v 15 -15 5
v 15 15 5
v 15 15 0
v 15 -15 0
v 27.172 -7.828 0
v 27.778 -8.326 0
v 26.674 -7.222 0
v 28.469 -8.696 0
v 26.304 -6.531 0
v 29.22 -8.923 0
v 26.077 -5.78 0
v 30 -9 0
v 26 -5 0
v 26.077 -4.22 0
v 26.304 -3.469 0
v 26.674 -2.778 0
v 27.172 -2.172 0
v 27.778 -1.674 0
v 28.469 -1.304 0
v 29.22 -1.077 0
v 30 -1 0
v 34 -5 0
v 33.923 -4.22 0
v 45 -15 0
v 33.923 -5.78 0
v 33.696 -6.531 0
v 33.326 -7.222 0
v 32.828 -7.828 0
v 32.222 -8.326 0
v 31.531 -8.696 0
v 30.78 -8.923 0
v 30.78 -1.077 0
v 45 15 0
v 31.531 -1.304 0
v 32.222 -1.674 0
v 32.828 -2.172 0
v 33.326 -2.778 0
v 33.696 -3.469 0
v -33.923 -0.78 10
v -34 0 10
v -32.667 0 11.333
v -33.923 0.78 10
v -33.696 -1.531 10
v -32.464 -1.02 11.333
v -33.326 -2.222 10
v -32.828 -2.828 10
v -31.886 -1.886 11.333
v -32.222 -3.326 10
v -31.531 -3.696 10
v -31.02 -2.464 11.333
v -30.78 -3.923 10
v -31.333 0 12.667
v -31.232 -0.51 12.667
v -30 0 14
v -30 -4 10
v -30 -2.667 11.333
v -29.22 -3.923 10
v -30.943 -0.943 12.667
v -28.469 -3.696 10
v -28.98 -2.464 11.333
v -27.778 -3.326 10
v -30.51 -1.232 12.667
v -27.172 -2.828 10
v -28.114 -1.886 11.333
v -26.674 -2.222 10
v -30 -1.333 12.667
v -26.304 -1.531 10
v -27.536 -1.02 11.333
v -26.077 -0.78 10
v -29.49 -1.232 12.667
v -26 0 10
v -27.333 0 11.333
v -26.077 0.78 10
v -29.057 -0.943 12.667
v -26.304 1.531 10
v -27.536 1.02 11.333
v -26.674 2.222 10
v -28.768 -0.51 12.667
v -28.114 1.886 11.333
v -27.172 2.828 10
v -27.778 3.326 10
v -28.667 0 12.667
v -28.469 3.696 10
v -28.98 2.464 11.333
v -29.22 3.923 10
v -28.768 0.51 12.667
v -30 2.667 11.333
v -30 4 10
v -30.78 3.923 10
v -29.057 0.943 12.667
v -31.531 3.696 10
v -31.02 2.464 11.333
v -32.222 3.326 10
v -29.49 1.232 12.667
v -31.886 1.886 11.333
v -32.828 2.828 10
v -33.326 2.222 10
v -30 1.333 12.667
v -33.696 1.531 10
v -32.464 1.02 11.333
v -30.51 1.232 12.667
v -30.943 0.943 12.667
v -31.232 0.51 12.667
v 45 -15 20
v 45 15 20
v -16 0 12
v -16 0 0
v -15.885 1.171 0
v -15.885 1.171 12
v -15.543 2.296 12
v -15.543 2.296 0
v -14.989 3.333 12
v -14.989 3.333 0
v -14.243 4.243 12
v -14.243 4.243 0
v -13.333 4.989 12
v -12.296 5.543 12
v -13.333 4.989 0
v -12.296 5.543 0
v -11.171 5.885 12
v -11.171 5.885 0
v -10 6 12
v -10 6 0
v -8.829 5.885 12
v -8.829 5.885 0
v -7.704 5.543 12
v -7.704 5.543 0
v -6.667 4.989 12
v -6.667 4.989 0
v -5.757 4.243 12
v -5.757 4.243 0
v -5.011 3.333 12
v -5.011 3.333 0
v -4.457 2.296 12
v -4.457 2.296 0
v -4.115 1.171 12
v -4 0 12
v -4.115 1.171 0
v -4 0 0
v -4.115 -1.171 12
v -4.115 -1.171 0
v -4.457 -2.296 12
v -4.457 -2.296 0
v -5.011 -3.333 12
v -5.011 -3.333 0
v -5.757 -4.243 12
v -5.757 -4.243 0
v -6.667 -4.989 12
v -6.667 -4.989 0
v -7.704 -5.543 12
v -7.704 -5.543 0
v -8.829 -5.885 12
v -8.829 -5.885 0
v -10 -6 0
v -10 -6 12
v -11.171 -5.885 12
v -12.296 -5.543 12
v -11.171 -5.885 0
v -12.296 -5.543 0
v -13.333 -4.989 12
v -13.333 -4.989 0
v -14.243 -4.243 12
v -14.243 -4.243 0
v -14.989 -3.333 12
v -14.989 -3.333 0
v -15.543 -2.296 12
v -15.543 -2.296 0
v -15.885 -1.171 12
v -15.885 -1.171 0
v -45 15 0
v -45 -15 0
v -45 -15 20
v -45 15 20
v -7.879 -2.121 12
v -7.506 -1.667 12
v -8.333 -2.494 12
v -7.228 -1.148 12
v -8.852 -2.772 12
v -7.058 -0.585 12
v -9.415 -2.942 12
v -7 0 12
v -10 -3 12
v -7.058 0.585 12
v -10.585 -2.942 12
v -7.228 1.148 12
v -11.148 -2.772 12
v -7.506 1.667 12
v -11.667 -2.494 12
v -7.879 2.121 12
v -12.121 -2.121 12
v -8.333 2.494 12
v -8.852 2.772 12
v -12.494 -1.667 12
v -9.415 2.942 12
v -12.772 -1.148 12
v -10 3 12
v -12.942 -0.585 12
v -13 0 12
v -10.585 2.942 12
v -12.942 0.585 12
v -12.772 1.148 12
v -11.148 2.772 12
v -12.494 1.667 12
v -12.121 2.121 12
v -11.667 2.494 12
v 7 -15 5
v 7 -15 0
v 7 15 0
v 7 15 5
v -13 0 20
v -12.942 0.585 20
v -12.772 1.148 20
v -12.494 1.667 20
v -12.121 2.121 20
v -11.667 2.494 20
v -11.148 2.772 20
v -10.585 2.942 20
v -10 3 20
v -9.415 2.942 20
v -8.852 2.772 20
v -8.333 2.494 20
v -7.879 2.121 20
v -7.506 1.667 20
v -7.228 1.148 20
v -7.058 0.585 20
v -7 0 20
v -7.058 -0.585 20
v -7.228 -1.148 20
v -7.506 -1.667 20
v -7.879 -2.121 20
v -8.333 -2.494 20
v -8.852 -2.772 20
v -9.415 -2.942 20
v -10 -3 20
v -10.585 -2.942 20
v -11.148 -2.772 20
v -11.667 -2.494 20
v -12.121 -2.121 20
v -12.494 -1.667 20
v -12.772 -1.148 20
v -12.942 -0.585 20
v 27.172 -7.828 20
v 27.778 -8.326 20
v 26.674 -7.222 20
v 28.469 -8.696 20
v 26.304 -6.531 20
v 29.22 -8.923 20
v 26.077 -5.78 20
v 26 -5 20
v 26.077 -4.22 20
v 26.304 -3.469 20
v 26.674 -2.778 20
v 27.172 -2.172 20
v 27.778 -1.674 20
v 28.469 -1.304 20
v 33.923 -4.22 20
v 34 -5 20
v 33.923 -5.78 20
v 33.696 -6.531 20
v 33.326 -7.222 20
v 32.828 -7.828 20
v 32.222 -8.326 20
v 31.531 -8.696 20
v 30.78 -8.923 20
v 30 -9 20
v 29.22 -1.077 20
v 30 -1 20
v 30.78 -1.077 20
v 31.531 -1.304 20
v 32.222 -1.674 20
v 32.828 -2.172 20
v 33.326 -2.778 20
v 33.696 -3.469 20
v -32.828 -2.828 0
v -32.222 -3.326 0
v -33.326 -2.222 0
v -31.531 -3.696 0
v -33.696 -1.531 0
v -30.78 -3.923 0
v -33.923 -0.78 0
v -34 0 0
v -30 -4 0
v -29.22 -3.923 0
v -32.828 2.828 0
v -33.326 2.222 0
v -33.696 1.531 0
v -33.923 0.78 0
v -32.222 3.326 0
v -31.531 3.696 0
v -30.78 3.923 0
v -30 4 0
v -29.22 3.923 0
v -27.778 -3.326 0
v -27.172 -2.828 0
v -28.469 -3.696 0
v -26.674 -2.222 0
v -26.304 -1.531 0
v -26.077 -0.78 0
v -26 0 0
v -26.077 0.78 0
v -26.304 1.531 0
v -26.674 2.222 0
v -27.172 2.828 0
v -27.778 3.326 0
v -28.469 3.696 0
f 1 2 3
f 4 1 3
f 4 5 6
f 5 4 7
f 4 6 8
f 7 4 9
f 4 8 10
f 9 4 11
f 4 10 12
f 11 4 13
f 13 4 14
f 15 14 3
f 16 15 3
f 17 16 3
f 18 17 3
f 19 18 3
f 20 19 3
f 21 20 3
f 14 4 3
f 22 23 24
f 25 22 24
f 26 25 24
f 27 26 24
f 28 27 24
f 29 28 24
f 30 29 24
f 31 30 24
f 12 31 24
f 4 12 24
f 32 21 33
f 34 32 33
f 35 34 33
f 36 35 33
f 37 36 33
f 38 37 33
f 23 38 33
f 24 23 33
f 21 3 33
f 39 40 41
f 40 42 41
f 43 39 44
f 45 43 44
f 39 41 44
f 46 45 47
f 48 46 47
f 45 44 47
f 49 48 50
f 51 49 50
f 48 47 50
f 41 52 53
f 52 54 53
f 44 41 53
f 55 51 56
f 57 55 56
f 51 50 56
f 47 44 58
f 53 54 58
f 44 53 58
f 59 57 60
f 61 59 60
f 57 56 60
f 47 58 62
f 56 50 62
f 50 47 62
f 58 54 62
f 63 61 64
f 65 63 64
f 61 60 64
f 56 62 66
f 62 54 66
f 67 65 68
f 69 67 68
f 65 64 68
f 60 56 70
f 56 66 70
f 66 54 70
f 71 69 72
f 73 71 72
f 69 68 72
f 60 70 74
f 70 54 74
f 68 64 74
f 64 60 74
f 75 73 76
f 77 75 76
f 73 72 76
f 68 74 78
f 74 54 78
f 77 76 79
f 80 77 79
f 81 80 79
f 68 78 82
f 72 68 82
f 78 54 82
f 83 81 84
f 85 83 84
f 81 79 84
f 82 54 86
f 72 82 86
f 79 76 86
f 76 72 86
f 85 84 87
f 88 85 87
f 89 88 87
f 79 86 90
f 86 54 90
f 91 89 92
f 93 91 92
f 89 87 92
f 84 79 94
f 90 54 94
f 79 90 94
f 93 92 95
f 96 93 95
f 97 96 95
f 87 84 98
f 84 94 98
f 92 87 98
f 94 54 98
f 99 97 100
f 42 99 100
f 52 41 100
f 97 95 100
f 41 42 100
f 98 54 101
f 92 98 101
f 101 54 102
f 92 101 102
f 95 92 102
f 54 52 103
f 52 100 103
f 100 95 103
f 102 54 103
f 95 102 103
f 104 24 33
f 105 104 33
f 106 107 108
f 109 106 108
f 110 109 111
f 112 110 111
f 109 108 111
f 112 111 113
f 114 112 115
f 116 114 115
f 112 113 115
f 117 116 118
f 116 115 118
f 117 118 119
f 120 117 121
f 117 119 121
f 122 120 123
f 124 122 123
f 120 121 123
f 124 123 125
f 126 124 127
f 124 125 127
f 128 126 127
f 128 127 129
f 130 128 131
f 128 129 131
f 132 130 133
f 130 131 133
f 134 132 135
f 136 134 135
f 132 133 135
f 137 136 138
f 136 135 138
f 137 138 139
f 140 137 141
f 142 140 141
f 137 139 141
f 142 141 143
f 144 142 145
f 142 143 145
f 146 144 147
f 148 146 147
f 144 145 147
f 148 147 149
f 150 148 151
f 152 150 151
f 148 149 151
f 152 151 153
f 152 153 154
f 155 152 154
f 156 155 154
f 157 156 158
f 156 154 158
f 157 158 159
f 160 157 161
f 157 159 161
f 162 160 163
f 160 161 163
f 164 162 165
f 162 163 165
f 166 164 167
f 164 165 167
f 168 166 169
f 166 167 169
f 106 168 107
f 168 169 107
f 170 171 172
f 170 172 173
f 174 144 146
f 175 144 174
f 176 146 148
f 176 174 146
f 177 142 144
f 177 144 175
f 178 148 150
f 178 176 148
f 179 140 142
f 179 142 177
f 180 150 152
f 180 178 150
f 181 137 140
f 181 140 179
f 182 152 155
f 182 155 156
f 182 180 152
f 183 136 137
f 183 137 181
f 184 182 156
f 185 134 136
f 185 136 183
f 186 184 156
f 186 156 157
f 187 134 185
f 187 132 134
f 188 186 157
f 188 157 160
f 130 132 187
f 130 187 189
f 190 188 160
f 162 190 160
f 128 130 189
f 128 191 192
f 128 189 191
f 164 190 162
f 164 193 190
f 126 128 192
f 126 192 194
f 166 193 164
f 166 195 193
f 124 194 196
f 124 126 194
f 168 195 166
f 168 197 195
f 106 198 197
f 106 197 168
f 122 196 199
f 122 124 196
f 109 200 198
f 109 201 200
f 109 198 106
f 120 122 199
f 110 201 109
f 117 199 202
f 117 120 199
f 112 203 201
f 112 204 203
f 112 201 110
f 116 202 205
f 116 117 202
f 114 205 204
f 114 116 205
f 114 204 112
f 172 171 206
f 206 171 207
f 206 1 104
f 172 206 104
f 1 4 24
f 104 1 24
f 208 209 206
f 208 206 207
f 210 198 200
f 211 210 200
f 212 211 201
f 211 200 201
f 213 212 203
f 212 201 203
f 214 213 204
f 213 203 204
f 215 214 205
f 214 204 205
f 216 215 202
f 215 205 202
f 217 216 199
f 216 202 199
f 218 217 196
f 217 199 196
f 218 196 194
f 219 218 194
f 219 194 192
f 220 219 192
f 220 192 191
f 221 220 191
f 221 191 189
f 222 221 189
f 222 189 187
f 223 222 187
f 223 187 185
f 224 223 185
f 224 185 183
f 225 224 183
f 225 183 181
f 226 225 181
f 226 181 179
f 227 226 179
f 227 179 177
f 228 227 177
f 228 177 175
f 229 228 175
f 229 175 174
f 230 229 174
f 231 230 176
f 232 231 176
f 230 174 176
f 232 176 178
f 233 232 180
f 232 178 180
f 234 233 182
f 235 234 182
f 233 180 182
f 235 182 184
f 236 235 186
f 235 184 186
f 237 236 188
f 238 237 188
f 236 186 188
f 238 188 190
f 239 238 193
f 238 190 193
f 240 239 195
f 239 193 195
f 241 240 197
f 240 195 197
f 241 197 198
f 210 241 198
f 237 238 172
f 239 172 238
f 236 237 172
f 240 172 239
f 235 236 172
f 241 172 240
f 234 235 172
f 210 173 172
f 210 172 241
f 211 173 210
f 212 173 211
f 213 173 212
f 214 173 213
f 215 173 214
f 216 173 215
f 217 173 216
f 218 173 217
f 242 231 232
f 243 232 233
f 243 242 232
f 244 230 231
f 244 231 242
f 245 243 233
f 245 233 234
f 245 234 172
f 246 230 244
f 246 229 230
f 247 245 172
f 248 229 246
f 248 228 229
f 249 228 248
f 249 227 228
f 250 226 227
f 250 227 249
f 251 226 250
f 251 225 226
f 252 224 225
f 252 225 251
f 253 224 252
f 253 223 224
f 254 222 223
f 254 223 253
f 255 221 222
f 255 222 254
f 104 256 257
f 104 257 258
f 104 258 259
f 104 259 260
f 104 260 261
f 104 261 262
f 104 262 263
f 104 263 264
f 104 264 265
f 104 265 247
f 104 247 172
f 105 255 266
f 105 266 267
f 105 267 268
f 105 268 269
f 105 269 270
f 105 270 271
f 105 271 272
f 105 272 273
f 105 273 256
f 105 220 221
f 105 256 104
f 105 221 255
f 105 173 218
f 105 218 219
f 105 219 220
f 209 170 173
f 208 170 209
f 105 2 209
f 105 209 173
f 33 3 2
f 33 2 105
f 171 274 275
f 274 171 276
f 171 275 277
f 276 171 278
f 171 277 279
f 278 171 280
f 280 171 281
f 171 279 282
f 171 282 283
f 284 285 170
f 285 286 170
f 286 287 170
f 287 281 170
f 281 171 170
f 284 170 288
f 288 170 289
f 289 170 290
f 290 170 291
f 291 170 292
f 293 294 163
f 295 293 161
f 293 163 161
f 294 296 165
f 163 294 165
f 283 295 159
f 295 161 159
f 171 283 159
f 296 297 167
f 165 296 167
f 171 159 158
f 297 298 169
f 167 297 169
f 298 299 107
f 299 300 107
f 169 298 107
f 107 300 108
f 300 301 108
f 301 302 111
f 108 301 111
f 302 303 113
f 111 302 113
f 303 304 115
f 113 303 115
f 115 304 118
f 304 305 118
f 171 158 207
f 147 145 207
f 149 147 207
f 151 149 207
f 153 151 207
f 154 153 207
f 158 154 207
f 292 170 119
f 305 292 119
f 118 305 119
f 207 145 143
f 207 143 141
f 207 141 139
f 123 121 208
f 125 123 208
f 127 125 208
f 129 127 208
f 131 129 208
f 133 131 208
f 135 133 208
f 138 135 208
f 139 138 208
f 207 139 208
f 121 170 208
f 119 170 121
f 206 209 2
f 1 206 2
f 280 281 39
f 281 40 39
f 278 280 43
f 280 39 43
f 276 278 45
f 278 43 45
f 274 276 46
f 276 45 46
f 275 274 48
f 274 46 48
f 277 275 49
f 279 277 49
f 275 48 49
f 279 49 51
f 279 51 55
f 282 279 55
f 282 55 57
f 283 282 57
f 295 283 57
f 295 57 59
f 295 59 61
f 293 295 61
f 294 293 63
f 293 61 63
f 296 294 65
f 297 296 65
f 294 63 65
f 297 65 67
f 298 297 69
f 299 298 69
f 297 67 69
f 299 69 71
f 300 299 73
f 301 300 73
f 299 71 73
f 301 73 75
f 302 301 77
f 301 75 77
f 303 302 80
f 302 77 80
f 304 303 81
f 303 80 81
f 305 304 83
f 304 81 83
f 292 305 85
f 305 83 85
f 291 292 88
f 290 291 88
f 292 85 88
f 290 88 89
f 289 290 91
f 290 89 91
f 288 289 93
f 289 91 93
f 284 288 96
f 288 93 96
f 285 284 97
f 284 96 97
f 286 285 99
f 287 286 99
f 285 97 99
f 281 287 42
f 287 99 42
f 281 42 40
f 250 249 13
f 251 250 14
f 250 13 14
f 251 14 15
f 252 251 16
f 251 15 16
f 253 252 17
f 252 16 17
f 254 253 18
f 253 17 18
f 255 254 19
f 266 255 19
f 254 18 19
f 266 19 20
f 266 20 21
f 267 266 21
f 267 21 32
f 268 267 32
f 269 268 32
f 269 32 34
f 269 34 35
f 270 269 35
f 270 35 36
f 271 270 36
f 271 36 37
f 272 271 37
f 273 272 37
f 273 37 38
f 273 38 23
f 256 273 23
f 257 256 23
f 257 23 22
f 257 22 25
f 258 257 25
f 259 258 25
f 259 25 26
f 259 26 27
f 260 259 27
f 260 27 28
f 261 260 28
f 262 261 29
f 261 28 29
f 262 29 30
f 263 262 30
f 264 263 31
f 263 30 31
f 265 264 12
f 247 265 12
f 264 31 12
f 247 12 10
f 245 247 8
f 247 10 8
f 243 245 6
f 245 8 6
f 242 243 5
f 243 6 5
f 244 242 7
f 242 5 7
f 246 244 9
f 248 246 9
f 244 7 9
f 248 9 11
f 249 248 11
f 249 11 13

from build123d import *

# Parameters (mm, degrees)
SKETCH_1_W          = 90
SKETCH_1_H          = 30
EXTRUDE_1_DEPTH     = 20
SKETCH_3_R          = 6
CUT_EXTRUDE_1_DEPTH = 12
SKETCH_4_R          = 3
CUT_EXTRUDE_2_DEPTH = 49.928519291
SKETCH_5_W          = 8
SKETCH_5_H          = 5
CUT_EXTRUDE_3_DEPTH = 58.662812973
SKETCH_6_R          = 4
CUT_EXTRUDE_4_DEPTH = 52.478150705


with BuildPart() as part:
    # Эскиз1 → Бобышка-Вытянуть1 (new body)
    with BuildSketch(Plane.XY):
        Rectangle(SKETCH_1_W, SKETCH_1_H)
    extrude(amount=EXTRUDE_1_DEPTH)

    # Эскиз2 → Вырез-Повернуть1 (revolve, cut)
    with BuildSketch(Plane(origin=(0, 0, 0), x_dir=(1, 0, 0), z_dir=(0, 1, 0)), mode=Mode.PRIVATE) as cut_revolve_1_sk:
        Polygon((-30, 0), (-26, 0), (-26, -10), (-30, -14), align=None)
    revolve(cut_revolve_1_sk.sketch.rotate(Axis((-30, 0, 0), (0, 0, 1)), 180), axis=Axis((-30, 0, 0), (0, 0, 1)), mode=Mode.SUBTRACT)

    # Эскиз3 → Вырез-Вытянуть1 (cut)
    with BuildSketch(Plane(origin=(0, 0, 0), x_dir=(-1, 0, 0), z_dir=(0, 0, -1))):
        with Locations((10, 0)):
            Circle(SKETCH_3_R)
    extrude(amount=-CUT_EXTRUDE_1_DEPTH, mode=Mode.SUBTRACT)

    # Эскиз4 → Вырез-Вытянуть2 (cut, through all)
    with BuildSketch(Plane(origin=(0, 0, 12), x_dir=(-1, 0, 0), z_dir=(0, 0, -1))):
        with Locations((10, 0)):
            Circle(SKETCH_4_R)
    extrude(amount=-CUT_EXTRUDE_2_DEPTH, mode=Mode.SUBTRACT)

    # Эскиз5 → Вырез-Вытянуть3 (cut, through all)
    with BuildSketch(Plane(origin=(0, 15, 0), x_dir=(1, 0, 0), z_dir=(0, 1, 0))):
        with Locations((11, -2.5)):
            Rectangle(SKETCH_5_W, SKETCH_5_H)
    extrude(amount=-CUT_EXTRUDE_3_DEPTH, mode=Mode.SUBTRACT)

    # Эскиз6 → Вырез-Вытянуть4 (cut, through all)
    with BuildSketch(Plane(origin=(0, 0, 0), x_dir=(-1, 0, 0), z_dir=(0, 0, -1))):
        with Locations((-30, -5)):
            Circle(SKETCH_6_R)
    extrude(amount=-CUT_EXTRUDE_4_DEPTH, mode=Mode.SUBTRACT)


solid = part.part
